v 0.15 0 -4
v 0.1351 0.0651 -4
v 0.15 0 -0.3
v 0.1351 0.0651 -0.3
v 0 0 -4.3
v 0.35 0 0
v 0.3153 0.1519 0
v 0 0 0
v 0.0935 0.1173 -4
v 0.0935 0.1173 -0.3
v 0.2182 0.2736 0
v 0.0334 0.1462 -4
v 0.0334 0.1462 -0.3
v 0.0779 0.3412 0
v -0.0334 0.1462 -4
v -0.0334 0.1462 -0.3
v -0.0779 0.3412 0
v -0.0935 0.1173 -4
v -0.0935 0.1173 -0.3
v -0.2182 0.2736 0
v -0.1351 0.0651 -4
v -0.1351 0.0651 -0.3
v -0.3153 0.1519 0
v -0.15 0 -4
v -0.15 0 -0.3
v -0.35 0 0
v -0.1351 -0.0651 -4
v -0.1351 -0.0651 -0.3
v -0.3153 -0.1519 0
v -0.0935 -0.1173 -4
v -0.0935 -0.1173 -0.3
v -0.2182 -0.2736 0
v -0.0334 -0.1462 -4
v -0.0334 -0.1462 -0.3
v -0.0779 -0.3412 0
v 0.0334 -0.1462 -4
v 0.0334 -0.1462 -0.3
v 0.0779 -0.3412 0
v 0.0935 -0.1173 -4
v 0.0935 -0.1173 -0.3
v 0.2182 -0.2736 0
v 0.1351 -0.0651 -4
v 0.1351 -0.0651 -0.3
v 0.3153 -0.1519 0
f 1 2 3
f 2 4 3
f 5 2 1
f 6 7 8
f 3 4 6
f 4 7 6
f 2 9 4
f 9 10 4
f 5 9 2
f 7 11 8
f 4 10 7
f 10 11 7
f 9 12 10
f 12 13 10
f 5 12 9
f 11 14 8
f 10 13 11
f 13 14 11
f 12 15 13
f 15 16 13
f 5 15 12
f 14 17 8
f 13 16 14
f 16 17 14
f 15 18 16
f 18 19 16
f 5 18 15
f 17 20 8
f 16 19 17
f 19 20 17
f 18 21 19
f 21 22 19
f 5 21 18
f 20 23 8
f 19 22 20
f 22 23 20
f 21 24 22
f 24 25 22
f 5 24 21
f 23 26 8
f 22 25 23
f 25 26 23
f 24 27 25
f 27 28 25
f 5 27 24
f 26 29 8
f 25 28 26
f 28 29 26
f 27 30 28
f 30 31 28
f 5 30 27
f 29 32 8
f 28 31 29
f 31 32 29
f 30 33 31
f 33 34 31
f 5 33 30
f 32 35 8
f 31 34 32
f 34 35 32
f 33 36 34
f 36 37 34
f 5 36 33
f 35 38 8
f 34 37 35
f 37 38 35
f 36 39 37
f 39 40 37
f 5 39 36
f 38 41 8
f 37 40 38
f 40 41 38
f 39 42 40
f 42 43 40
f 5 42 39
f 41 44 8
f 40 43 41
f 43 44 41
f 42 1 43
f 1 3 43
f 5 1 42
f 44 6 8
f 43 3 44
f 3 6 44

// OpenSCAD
module smallscrew(rotation=0) 
{
    screw_width = 0.3;
    screw_length = 4.0;
    end_diameter = 0.7;
    end_length = 0.3;
    sharp_length = 0.3;
  
    points=[
        [0,0],
        [end_diameter/2, 0],
        [screw_width/2, end_length],
        [screw_width/2, end_length+screw_length-sharp_length],
        [0, end_length+screw_length],
        [0,0]
    ];
 
    rotate([0,180,rotation]) 
    color([0.9,0.8,0.2])
    rotate_extrude(convexity = 1, $fn = 14) polygon(points);
    
 
}

smallscrew();
